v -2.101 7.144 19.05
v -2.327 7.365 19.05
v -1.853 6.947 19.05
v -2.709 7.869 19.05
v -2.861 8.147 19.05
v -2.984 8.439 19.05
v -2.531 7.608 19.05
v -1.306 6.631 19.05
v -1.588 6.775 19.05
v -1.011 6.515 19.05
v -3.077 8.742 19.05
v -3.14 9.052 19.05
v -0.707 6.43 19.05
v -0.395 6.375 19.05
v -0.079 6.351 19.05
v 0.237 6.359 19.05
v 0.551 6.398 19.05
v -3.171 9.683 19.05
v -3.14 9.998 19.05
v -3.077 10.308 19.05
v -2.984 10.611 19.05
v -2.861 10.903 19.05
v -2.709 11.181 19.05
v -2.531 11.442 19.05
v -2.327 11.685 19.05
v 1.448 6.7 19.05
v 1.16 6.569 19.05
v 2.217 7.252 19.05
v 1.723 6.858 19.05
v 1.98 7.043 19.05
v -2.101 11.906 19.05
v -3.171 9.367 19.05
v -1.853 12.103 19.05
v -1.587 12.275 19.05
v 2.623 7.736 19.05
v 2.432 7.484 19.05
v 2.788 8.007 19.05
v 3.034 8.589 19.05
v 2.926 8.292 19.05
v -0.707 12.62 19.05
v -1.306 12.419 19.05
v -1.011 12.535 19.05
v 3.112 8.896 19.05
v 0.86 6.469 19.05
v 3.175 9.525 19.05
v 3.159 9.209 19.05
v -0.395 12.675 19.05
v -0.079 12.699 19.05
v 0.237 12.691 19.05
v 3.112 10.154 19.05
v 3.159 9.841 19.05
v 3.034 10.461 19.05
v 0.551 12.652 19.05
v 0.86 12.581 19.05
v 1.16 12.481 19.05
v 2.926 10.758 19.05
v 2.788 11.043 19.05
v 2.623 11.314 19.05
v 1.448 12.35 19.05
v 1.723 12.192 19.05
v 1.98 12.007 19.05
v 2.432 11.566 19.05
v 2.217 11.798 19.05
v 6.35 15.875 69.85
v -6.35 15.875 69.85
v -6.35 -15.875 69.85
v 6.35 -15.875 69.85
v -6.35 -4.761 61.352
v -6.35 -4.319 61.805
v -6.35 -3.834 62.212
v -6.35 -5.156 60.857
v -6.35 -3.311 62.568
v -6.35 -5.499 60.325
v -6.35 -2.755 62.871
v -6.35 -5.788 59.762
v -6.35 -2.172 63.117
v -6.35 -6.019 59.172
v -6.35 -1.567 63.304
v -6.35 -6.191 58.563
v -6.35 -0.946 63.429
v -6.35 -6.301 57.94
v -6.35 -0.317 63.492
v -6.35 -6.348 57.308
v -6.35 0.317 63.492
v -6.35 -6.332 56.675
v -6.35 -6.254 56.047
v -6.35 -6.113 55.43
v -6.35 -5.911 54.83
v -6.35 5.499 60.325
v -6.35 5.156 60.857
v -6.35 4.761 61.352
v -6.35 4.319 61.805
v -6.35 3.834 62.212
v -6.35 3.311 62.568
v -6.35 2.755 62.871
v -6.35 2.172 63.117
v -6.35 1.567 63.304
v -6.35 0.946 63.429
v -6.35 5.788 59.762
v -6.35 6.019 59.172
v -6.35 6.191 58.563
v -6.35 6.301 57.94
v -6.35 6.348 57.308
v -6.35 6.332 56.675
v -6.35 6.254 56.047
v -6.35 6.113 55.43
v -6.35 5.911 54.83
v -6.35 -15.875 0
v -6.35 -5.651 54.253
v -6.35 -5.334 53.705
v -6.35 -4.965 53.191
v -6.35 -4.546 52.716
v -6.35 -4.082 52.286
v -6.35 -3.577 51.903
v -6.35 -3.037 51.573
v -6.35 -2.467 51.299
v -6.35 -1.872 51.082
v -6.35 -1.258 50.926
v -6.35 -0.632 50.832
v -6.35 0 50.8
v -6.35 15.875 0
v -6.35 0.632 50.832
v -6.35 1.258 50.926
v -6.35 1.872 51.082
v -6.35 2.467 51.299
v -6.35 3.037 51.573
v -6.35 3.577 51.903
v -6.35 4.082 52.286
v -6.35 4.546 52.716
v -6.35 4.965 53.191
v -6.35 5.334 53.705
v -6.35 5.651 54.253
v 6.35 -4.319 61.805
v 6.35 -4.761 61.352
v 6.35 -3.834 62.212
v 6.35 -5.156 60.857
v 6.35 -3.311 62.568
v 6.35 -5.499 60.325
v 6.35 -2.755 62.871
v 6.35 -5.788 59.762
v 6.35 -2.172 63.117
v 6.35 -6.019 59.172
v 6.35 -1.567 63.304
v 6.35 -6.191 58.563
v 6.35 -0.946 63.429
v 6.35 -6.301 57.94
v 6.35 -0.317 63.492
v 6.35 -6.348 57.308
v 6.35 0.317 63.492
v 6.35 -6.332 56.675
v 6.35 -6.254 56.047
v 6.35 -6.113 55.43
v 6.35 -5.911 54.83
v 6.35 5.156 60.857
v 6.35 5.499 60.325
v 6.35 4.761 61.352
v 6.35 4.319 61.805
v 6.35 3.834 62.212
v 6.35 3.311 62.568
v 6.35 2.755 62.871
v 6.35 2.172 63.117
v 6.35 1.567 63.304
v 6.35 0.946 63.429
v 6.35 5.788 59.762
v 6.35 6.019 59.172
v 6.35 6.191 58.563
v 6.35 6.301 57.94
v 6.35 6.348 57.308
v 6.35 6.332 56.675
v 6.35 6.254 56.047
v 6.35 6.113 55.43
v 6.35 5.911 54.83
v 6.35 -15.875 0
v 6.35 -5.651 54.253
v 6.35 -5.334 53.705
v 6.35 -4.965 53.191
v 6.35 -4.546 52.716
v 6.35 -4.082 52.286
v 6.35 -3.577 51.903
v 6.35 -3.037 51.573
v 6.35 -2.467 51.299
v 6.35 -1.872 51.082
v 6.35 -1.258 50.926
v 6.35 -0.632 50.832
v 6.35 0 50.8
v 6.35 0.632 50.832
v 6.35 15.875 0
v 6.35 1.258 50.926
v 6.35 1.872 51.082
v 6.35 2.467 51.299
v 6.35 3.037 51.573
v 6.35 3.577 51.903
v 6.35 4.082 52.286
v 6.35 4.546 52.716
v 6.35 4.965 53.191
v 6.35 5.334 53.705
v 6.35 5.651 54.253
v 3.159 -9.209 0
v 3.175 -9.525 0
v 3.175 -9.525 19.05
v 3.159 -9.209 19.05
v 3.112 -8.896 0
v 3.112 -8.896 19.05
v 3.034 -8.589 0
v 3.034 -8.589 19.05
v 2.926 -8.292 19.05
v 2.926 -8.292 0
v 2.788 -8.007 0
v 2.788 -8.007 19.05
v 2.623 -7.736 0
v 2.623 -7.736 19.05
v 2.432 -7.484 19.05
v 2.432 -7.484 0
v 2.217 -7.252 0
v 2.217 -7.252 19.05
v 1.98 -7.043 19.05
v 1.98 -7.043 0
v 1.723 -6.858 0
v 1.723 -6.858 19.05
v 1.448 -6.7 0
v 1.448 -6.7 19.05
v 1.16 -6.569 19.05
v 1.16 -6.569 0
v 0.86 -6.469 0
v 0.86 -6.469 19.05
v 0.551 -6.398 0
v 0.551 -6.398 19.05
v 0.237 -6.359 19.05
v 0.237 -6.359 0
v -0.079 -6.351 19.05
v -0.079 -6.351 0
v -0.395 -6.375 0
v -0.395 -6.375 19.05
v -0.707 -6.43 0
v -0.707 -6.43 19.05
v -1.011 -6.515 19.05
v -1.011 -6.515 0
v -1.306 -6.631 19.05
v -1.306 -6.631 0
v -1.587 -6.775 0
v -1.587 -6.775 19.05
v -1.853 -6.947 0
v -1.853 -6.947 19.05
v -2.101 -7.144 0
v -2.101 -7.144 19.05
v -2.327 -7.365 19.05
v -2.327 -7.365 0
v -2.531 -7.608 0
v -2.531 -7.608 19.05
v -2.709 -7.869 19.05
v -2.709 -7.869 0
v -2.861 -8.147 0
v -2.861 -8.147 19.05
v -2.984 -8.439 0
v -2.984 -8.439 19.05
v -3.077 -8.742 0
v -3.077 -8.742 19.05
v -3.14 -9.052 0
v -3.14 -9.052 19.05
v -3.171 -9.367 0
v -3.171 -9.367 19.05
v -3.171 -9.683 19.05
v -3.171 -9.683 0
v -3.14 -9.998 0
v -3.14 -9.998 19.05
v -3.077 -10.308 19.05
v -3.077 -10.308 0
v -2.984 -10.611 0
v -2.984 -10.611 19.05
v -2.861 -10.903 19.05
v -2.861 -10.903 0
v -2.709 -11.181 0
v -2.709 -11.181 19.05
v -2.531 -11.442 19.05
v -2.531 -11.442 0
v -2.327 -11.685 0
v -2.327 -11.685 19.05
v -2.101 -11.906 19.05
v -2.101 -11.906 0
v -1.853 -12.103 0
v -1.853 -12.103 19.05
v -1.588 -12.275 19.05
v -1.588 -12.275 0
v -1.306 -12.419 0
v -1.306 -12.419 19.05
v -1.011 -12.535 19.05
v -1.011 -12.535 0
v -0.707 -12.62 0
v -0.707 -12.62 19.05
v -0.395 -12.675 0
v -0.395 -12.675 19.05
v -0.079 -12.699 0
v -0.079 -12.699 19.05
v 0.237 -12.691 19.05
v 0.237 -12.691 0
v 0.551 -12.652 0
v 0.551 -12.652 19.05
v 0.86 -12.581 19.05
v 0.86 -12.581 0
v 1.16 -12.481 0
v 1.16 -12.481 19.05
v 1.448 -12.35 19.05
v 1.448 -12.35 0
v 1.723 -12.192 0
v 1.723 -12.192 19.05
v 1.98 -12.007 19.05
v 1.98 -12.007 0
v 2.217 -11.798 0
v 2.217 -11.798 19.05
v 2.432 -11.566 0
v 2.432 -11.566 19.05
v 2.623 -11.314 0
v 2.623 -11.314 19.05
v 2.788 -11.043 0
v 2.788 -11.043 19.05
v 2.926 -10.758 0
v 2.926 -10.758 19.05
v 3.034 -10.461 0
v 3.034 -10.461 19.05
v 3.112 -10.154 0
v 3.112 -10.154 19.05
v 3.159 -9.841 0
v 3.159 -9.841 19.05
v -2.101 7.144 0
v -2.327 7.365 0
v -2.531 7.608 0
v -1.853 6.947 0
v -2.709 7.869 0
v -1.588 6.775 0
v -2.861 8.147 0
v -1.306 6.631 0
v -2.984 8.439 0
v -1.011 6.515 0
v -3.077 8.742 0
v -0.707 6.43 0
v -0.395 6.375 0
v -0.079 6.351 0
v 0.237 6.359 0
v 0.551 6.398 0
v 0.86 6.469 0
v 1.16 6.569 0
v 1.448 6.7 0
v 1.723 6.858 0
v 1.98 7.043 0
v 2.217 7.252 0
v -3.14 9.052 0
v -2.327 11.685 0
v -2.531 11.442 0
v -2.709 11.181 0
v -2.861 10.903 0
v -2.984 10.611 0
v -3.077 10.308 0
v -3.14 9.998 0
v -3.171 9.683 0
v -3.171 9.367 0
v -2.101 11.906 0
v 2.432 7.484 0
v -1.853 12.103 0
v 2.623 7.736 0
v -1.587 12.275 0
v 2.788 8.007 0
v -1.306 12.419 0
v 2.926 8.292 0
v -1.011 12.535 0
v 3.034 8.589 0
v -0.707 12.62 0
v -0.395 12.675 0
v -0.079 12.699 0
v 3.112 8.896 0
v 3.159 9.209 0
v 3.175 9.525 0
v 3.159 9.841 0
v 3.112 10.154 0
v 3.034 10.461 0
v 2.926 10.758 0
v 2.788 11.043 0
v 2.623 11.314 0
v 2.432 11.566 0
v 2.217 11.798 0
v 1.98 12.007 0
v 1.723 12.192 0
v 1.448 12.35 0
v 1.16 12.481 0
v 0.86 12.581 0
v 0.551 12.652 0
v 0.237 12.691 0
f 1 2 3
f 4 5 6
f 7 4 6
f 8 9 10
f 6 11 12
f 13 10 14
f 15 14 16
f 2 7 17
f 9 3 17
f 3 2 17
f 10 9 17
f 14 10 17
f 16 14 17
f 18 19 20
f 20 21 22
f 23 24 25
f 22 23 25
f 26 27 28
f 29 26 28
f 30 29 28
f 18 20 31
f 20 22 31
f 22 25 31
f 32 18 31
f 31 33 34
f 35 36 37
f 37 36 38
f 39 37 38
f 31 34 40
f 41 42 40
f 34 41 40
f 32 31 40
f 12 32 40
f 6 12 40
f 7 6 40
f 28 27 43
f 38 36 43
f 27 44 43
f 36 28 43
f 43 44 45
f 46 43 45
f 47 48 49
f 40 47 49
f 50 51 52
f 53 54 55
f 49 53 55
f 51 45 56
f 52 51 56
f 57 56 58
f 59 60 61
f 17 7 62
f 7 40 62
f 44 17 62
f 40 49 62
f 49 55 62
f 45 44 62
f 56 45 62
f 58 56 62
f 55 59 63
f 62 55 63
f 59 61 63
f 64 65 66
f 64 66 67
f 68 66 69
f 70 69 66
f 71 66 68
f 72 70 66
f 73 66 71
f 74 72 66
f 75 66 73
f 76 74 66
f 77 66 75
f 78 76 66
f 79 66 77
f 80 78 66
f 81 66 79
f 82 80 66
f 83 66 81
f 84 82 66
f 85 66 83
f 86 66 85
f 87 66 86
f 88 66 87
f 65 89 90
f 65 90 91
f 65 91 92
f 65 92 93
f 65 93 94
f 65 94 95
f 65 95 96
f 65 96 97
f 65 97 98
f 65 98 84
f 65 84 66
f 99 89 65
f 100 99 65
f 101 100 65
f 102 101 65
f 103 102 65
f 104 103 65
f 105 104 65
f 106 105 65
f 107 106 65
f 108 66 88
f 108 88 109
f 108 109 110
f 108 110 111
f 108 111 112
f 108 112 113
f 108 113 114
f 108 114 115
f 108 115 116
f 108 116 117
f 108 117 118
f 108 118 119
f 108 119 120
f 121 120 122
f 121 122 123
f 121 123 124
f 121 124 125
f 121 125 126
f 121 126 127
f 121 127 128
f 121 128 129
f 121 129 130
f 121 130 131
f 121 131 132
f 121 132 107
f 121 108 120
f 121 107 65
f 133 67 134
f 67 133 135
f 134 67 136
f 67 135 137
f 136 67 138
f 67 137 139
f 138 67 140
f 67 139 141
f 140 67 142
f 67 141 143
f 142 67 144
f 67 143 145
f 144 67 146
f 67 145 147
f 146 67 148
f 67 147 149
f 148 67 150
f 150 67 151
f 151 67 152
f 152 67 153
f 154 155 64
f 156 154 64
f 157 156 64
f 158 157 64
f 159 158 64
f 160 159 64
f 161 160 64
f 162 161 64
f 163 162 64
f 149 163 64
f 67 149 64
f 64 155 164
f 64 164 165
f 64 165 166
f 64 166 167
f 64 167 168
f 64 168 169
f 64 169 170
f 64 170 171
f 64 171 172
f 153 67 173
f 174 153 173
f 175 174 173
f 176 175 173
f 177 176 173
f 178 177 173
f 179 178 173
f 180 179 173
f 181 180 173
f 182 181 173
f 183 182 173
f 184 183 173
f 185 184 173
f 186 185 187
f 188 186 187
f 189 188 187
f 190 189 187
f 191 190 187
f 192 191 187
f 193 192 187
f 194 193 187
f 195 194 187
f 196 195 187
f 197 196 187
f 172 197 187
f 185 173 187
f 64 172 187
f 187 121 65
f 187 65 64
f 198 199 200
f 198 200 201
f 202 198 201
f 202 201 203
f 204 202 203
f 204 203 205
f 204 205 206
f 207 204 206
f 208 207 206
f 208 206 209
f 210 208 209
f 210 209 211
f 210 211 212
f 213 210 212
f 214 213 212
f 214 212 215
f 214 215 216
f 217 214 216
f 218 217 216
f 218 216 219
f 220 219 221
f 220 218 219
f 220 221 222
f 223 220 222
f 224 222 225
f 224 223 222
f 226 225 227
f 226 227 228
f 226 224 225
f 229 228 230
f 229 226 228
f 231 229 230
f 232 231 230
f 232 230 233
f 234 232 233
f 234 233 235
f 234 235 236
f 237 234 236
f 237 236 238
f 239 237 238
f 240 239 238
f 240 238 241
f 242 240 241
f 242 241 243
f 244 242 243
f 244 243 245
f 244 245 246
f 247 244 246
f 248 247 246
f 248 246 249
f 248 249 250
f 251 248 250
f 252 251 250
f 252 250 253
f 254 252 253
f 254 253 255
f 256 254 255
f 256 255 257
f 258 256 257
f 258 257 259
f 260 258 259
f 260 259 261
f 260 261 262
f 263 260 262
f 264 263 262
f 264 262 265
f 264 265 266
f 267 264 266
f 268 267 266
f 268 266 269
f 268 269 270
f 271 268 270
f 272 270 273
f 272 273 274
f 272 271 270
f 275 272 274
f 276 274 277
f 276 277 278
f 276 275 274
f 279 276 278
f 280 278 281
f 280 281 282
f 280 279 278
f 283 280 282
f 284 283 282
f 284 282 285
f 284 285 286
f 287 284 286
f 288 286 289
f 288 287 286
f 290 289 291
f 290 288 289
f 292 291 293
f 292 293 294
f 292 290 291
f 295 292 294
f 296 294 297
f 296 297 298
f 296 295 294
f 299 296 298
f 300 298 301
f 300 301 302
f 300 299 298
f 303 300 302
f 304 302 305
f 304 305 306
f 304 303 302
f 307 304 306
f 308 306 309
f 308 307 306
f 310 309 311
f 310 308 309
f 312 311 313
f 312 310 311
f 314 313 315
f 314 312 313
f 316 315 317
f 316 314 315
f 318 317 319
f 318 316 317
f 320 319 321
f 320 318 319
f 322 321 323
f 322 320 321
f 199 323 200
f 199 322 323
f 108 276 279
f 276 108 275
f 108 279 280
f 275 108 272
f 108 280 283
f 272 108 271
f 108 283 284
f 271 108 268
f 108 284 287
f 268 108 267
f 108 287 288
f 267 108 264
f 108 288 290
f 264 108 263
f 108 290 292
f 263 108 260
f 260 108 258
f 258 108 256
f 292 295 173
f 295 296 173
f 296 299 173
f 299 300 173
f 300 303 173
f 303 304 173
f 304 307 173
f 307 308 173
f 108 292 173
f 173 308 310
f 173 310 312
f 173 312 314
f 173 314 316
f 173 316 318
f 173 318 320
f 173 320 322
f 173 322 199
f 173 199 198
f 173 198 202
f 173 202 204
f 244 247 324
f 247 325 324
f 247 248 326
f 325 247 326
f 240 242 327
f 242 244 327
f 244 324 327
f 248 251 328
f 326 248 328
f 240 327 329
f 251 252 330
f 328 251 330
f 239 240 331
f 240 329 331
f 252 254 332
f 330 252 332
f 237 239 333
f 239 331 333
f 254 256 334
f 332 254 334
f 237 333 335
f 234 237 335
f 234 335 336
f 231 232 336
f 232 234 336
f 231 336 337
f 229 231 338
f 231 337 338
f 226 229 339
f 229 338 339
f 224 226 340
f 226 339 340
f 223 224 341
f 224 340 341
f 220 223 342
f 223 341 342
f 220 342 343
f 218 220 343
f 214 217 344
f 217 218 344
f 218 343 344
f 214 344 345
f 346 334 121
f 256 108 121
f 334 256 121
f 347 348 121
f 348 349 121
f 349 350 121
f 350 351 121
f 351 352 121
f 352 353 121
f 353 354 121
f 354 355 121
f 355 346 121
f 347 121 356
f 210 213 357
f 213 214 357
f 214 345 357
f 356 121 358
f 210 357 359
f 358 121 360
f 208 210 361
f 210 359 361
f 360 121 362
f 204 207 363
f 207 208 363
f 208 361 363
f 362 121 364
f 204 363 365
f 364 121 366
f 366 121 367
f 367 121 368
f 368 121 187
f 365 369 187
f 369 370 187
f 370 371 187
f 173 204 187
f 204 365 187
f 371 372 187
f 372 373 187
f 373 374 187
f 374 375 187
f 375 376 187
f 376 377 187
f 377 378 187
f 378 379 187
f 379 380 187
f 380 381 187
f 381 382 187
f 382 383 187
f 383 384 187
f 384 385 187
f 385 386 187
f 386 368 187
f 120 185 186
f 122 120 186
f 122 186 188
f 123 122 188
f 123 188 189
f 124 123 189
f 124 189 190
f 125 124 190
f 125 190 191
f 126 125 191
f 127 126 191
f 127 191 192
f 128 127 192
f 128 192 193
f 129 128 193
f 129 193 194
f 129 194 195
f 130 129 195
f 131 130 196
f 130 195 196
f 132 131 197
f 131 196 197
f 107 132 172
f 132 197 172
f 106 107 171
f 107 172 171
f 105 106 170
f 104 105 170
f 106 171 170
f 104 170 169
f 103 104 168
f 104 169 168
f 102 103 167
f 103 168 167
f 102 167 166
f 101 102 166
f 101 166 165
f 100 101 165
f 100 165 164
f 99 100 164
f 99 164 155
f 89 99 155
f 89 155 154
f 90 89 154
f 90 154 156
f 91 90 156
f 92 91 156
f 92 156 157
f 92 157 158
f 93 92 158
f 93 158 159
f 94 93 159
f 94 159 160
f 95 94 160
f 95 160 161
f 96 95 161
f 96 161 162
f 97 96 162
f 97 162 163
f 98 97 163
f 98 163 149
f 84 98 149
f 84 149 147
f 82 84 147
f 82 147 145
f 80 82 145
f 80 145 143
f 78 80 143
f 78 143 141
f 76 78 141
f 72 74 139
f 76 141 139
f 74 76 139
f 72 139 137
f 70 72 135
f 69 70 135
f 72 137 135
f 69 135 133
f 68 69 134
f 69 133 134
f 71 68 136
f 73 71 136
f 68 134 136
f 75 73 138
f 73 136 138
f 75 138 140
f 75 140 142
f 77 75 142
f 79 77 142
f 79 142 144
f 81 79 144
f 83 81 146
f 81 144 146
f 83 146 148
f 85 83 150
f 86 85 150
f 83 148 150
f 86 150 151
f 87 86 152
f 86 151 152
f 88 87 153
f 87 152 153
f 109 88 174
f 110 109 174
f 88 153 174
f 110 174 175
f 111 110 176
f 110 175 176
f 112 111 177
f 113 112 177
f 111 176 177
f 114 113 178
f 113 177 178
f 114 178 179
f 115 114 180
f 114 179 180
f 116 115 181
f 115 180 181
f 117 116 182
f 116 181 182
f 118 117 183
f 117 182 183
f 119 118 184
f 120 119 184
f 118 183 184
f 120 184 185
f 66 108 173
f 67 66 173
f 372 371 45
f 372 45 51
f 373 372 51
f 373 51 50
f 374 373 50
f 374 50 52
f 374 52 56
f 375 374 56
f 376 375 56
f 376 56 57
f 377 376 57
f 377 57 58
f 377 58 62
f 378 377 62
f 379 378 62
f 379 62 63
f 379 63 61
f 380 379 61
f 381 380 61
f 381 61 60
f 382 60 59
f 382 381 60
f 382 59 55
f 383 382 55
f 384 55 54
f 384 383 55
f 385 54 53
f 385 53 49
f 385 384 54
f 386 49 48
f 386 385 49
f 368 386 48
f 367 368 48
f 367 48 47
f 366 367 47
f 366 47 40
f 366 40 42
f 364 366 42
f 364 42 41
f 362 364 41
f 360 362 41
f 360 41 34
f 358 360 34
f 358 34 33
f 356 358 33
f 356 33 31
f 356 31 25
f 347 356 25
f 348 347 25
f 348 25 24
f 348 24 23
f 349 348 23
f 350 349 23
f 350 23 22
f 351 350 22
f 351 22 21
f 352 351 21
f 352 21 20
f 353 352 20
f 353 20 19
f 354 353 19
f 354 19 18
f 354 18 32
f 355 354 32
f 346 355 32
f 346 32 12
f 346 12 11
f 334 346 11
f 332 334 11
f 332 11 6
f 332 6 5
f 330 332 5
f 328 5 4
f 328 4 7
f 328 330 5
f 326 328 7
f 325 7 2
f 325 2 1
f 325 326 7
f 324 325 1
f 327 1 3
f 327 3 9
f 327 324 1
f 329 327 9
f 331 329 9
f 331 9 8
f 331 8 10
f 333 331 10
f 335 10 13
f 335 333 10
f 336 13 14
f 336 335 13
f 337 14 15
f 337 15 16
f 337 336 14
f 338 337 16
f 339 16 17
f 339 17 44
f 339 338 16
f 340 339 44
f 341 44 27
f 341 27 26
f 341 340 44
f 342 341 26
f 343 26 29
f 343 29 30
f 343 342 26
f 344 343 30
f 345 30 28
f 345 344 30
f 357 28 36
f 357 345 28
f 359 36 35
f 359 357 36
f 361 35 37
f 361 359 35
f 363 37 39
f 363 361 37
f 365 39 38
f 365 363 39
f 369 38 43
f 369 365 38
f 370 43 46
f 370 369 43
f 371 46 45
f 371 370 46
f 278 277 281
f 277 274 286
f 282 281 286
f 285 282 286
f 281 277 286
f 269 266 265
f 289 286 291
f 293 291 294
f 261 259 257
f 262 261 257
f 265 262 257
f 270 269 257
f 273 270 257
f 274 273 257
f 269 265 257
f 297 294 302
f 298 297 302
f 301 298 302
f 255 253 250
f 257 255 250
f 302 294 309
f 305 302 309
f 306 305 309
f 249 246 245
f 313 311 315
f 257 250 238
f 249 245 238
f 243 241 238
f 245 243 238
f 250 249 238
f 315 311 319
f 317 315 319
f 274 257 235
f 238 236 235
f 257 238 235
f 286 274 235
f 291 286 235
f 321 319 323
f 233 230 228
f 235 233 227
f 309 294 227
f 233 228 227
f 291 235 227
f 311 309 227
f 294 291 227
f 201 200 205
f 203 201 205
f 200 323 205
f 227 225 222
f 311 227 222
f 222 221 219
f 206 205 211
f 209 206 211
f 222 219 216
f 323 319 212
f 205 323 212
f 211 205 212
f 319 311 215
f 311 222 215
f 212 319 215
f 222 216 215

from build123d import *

# Parameters (mm, degrees)
SKETCH1_W           = 12.7
SKETCH1_H           = 31.75
SKETCH1_R           = 3.175
BOSS_EXTRUDE1_DEPTH = 69.85
SKETCH2_R           = 3.175
BOSS_EXTRUDE2_DEPTH = 50.8
SKETCH3_R           = 6.35
CUT_EXTRUDE1_DEPTH  = 13.7


with BuildPart() as part:
    # Sketch1 → Boss-Extrude1 (new body)
    with BuildSketch(Plane.XY):
        Rectangle(SKETCH1_W, SKETCH1_H)
        with Locations((0, 9.525)):
            Circle(SKETCH1_R, mode=Mode.SUBTRACT)
        with Locations((0, -9.525)):
            Circle(SKETCH1_R, mode=Mode.SUBTRACT)
    extrude(amount=BOSS_EXTRUDE1_DEPTH)

    # Sketch2 → Boss-Extrude2 (add)
    with BuildSketch(Plane.XY.offset(69.85)):
        with Locations((0, -9.525)):
            Circle(SKETCH2_R)
        with Locations((0, 9.525)):
            Circle(SKETCH2_R)
    extrude(amount=-BOSS_EXTRUDE2_DEPTH)

    # Sketch3 → Cut-Extrude1 (cut, through all)
    with BuildSketch(Plane(origin=(6.35, 0, 0), x_dir=(0, 0, -1), z_dir=(1, 0, 0))):
        with Locations((-57.15, 0)):
            Circle(SKETCH3_R)
    extrude(amount=-CUT_EXTRUDE1_DEPTH, mode=Mode.SUBTRACT)


solid = part.part
